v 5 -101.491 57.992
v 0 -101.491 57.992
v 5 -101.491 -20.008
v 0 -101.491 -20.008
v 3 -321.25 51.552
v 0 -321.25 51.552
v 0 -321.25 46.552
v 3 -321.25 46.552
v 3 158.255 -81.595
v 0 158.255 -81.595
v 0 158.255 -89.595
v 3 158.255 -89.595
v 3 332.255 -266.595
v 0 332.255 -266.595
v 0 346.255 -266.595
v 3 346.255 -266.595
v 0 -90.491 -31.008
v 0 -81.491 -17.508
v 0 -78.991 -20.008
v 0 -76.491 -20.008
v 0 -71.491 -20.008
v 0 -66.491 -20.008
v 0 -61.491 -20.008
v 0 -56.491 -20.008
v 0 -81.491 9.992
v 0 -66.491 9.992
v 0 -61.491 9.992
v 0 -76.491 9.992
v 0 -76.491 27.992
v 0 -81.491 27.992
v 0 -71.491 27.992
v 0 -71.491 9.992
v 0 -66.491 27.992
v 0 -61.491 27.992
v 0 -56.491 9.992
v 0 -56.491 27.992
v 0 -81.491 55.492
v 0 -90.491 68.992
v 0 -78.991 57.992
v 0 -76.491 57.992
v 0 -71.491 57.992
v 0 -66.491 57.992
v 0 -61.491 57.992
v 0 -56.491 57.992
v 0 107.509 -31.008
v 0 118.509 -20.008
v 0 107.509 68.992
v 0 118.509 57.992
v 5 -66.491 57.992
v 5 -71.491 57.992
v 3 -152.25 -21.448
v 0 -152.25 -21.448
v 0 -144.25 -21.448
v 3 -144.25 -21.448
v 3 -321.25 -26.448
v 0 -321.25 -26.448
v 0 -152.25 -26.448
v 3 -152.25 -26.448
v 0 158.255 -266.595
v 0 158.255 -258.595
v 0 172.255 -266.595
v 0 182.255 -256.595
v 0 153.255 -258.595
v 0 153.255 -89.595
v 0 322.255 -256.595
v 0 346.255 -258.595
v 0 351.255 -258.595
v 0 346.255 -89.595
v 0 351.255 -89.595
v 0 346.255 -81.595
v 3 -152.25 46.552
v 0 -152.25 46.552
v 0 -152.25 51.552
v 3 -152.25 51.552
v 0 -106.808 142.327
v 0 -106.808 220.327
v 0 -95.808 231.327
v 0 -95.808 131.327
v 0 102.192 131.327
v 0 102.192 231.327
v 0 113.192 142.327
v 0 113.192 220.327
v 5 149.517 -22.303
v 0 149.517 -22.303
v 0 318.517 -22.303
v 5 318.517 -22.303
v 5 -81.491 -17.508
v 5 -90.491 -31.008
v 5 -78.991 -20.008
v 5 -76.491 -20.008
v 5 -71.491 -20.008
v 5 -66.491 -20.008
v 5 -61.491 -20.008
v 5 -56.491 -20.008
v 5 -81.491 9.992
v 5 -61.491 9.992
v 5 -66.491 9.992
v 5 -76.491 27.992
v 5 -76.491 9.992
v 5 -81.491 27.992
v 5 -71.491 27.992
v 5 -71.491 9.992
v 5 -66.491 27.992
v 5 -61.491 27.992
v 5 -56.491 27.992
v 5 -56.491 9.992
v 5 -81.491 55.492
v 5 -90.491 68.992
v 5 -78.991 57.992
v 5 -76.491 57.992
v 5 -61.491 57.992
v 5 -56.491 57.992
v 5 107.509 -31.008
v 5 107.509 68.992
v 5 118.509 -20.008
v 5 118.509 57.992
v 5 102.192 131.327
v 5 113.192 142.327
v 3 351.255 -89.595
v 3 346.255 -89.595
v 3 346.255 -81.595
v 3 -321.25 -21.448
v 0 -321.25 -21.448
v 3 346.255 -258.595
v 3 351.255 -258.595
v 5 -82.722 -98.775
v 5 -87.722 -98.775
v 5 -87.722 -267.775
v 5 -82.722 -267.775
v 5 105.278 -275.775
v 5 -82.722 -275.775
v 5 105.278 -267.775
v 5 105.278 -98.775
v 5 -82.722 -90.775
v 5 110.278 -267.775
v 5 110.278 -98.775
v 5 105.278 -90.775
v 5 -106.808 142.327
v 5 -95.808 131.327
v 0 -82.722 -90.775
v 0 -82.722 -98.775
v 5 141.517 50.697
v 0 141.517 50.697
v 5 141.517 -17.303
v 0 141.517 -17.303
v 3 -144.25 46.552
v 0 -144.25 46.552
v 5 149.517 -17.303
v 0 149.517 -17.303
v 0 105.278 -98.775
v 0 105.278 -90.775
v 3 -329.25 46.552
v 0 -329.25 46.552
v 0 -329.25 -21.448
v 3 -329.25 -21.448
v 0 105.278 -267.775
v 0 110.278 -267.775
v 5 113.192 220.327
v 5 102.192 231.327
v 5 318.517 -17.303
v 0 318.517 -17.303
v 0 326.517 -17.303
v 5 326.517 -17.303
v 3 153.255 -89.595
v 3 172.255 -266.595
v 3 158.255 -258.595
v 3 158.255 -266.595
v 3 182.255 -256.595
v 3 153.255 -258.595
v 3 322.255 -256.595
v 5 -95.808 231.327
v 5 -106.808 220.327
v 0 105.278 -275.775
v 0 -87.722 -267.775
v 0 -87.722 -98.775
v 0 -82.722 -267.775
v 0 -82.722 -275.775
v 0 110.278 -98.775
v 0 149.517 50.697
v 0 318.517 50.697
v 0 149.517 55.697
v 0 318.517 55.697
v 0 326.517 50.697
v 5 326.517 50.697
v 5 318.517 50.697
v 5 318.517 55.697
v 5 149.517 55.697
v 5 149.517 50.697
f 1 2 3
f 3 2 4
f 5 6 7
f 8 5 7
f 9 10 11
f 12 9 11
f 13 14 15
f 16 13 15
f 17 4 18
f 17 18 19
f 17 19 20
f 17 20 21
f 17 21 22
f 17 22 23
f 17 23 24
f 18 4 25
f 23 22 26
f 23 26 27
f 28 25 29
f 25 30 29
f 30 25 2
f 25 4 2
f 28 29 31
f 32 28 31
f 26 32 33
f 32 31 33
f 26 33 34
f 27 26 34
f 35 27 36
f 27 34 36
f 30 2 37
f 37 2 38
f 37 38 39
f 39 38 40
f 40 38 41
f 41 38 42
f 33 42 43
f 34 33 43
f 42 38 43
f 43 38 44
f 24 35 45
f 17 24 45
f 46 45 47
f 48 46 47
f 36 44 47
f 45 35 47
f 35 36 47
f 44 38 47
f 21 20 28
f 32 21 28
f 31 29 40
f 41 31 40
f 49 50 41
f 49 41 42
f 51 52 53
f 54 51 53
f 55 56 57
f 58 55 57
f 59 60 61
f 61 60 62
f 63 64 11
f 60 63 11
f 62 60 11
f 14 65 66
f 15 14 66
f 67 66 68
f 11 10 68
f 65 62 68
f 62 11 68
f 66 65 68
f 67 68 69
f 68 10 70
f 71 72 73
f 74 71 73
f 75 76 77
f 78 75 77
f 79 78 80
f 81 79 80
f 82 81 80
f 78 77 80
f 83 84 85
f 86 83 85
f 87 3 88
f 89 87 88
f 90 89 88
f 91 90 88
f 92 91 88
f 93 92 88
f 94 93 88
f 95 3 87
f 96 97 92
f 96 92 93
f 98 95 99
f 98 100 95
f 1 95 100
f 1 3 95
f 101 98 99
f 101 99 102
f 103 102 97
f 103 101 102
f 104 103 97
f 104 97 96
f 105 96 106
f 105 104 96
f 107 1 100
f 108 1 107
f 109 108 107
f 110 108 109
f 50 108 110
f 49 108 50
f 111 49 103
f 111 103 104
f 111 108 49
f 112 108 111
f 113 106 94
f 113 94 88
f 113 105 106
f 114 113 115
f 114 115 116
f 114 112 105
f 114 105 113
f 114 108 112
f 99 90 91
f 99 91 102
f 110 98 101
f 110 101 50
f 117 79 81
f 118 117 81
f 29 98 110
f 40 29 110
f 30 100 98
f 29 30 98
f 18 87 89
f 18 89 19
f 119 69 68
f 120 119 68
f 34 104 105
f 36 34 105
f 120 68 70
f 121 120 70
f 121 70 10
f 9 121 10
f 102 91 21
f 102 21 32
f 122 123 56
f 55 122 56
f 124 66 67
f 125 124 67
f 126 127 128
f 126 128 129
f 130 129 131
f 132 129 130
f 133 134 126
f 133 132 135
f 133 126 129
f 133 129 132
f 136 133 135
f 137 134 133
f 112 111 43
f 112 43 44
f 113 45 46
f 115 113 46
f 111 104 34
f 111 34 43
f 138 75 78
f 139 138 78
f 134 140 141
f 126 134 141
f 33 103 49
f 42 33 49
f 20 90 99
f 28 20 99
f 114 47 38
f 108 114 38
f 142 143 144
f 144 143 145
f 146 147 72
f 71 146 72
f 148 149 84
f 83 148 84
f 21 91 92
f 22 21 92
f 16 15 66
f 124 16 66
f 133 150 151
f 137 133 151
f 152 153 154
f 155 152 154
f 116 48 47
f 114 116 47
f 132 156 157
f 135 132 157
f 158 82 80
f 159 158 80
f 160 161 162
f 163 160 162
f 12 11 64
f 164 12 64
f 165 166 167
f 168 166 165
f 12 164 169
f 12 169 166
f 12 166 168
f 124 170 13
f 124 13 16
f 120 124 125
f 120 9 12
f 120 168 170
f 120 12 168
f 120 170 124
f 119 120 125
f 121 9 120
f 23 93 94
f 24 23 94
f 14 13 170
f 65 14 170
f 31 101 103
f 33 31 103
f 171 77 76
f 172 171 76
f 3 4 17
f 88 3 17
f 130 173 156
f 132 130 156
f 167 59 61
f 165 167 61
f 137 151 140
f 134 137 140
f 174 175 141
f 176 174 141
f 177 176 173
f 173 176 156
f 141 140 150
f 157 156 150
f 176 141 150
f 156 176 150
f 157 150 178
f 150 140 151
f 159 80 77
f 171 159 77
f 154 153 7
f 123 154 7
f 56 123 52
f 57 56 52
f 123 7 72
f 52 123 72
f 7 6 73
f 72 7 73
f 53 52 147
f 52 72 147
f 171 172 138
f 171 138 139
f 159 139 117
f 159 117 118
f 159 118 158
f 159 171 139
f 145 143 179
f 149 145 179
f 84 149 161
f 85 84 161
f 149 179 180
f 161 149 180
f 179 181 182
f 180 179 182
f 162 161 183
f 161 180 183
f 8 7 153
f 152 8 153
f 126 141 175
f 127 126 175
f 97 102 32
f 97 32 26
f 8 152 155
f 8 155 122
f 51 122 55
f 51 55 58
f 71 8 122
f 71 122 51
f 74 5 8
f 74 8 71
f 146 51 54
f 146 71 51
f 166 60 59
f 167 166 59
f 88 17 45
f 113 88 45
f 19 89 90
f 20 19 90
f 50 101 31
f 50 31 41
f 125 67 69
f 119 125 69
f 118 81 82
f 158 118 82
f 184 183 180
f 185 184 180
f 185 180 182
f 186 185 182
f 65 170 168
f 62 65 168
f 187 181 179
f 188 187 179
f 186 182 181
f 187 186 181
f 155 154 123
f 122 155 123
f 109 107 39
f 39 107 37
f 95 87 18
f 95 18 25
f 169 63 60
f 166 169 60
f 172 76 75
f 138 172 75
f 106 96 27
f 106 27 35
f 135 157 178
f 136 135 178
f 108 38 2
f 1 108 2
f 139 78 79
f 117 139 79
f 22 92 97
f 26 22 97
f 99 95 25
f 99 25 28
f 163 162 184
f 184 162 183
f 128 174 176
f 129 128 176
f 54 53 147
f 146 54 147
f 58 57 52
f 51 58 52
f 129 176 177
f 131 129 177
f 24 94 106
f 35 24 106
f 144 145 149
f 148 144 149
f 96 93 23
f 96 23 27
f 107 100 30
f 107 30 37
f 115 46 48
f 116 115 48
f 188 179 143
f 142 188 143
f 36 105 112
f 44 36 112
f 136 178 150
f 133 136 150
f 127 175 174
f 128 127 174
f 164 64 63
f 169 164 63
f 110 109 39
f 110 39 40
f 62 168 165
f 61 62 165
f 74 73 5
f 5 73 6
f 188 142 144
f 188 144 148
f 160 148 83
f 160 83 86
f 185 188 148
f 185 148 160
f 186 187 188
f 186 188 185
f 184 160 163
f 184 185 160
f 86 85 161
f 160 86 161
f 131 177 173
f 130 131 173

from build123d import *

# Parameters (mm, degrees)
F1_DEPTH  = 5
F3_DEPTH  = 3
F5_DEPTH  = 5
F7_DEPTH  = 5
F9_DEPTH  = 5
F11_DEPTH = 3
F13_DEPTH = 25
F14_W     = 5
F14_H     = 30
F15_DEPTH = 25
F16_SIZE  = 2.5


with BuildPart() as f1:
    # F0 (on Right) → F1 (new body)
    with BuildSketch(Plane.YZ):
        Polygon((118.508511, 57.991617), (107.508511, 68.991617), (-90.491489, 68.991617), (-101.491489, 57.991617), (-101.491489, -20.008383), (-90.491489, -31.008383), (107.508511, -31.008383), (118.508511, -20.008383), align=None)
    extrude(amount=F1_DEPTH)

    # F14 (on face) → F15 (cut)
    with BuildSketch(Plane.YZ.offset(5)):
        with Locations((-78.991489, 42.991617)):
            Rectangle(F14_W, F14_H)
        with Locations((-78.991489, -5.008383)):
            Rectangle(F14_W, F14_H)
        with Locations((-68.991489, 42.991617)):
            Rectangle(F14_W, F14_H)
        with Locations((-68.991489, -5.008383)):
            Rectangle(F14_W, F14_H)
        with Locations((-58.991489, 42.991617)):
            Rectangle(F14_W, F14_H)
        with Locations((-58.991489, -5.008383)):
            Rectangle(F14_W, F14_H)
    extrude(amount=-F15_DEPTH, mode=Mode.SUBTRACT)

    # F16
    f16_edges = [f1.edges().sort_by_distance(p)[0] for p in [
        (2.5, -81.491489, -20.008383),
        (2.5, -81.491489, 57.991617),
    ]]
    chamfer(f16_edges, length=F16_SIZE)


with BuildPart() as f3:
    # F2 (on Right) → F3 (new body)
    with BuildSketch(Plane.YZ):
        Polygon((-152.250041, 51.551747), (-321.250041, 51.551747), (-321.250041, 46.551747), (-329.250041, 46.551747), (-329.250041, -21.448253), (-321.250041, -21.448253), (-321.250041, -26.448253), (-152.250041, -26.448253), (-152.250041, -21.448253), (-144.250041, -21.448253), (-144.250041, 46.551747), (-152.250041, 46.551747), align=None)
    extrude(amount=F3_DEPTH)


with BuildPart() as f5:
    # F4 (on Right) → F5 (new body)
    with BuildSketch(Plane.YZ):
        Polygon((113.192388, 220.327366), (102.192388, 231.327366), (-95.807612, 231.327366), (-106.807612, 220.327366), (-106.807612, 142.327366), (-95.807612, 131.327366), (102.192388, 131.327366), (113.192388, 142.327366), align=None)
    extrude(amount=F5_DEPTH)


with BuildPart() as f7:
    # F6 (on Right) → F7 (new body)
    with BuildSketch(Plane.YZ):
        Polygon((318.516881, 55.696888), (149.516881, 55.696888), (149.516881, 50.696888), (141.516881, 50.696888), (141.516881, -17.303112), (149.516881, -17.303112), (149.516881, -22.303112), (318.516881, -22.303112), (318.516881, -17.303112), (326.516881, -17.303112), (326.516881, 50.696888), (318.516881, 50.696888), align=None)
    extrude(amount=F7_DEPTH)


with BuildPart() as f9:
    # F8 (on Right) → F9 (new body)
    with BuildSketch(Plane.YZ):
        Polygon((110.277842, -267.775178), (110.277842, -98.775178), (105.277842, -98.775178), (105.277842, -90.775178), (-82.722158, -90.775178), (-82.722158, -98.775178), (-87.722158, -98.775178), (-87.722158, -267.775178), (-82.722158, -267.775178), (-82.722158, -275.775178), (105.277842, -275.775178), (105.277842, -267.775178), align=None)
    extrude(amount=F9_DEPTH)


with BuildPart() as f11:
    # F10 (on Right) → F11 (new body)
    with BuildSketch(Plane.YZ):
        Polygon((351.255145, -258.595392), (351.255145, -89.595392), (346.255145, -89.595392), (346.255145, -81.595392), (158.255145, -81.595392), (158.255145, -89.595392), (153.255145, -89.595392), (153.255145, -258.595392), (158.255145, -258.595392), (158.255145, -266.595392), (346.255145, -266.595392), (346.255145, -258.595392), align=None)
    extrude(amount=F11_DEPTH)

    # F12 (on face) → F13 (cut)
    with BuildSketch(Plane.YZ.offset(3)):
        Polygon((182.255145, -256.595392), (172.255145, -266.595392), (332.255145, -266.595392), (322.255145, -256.595392), align=None)
    extrude(amount=-F13_DEPTH, mode=Mode.SUBTRACT)


solid = Compound([f1.part, f3.part, f5.part, f7.part, f9.part, f11.part])
